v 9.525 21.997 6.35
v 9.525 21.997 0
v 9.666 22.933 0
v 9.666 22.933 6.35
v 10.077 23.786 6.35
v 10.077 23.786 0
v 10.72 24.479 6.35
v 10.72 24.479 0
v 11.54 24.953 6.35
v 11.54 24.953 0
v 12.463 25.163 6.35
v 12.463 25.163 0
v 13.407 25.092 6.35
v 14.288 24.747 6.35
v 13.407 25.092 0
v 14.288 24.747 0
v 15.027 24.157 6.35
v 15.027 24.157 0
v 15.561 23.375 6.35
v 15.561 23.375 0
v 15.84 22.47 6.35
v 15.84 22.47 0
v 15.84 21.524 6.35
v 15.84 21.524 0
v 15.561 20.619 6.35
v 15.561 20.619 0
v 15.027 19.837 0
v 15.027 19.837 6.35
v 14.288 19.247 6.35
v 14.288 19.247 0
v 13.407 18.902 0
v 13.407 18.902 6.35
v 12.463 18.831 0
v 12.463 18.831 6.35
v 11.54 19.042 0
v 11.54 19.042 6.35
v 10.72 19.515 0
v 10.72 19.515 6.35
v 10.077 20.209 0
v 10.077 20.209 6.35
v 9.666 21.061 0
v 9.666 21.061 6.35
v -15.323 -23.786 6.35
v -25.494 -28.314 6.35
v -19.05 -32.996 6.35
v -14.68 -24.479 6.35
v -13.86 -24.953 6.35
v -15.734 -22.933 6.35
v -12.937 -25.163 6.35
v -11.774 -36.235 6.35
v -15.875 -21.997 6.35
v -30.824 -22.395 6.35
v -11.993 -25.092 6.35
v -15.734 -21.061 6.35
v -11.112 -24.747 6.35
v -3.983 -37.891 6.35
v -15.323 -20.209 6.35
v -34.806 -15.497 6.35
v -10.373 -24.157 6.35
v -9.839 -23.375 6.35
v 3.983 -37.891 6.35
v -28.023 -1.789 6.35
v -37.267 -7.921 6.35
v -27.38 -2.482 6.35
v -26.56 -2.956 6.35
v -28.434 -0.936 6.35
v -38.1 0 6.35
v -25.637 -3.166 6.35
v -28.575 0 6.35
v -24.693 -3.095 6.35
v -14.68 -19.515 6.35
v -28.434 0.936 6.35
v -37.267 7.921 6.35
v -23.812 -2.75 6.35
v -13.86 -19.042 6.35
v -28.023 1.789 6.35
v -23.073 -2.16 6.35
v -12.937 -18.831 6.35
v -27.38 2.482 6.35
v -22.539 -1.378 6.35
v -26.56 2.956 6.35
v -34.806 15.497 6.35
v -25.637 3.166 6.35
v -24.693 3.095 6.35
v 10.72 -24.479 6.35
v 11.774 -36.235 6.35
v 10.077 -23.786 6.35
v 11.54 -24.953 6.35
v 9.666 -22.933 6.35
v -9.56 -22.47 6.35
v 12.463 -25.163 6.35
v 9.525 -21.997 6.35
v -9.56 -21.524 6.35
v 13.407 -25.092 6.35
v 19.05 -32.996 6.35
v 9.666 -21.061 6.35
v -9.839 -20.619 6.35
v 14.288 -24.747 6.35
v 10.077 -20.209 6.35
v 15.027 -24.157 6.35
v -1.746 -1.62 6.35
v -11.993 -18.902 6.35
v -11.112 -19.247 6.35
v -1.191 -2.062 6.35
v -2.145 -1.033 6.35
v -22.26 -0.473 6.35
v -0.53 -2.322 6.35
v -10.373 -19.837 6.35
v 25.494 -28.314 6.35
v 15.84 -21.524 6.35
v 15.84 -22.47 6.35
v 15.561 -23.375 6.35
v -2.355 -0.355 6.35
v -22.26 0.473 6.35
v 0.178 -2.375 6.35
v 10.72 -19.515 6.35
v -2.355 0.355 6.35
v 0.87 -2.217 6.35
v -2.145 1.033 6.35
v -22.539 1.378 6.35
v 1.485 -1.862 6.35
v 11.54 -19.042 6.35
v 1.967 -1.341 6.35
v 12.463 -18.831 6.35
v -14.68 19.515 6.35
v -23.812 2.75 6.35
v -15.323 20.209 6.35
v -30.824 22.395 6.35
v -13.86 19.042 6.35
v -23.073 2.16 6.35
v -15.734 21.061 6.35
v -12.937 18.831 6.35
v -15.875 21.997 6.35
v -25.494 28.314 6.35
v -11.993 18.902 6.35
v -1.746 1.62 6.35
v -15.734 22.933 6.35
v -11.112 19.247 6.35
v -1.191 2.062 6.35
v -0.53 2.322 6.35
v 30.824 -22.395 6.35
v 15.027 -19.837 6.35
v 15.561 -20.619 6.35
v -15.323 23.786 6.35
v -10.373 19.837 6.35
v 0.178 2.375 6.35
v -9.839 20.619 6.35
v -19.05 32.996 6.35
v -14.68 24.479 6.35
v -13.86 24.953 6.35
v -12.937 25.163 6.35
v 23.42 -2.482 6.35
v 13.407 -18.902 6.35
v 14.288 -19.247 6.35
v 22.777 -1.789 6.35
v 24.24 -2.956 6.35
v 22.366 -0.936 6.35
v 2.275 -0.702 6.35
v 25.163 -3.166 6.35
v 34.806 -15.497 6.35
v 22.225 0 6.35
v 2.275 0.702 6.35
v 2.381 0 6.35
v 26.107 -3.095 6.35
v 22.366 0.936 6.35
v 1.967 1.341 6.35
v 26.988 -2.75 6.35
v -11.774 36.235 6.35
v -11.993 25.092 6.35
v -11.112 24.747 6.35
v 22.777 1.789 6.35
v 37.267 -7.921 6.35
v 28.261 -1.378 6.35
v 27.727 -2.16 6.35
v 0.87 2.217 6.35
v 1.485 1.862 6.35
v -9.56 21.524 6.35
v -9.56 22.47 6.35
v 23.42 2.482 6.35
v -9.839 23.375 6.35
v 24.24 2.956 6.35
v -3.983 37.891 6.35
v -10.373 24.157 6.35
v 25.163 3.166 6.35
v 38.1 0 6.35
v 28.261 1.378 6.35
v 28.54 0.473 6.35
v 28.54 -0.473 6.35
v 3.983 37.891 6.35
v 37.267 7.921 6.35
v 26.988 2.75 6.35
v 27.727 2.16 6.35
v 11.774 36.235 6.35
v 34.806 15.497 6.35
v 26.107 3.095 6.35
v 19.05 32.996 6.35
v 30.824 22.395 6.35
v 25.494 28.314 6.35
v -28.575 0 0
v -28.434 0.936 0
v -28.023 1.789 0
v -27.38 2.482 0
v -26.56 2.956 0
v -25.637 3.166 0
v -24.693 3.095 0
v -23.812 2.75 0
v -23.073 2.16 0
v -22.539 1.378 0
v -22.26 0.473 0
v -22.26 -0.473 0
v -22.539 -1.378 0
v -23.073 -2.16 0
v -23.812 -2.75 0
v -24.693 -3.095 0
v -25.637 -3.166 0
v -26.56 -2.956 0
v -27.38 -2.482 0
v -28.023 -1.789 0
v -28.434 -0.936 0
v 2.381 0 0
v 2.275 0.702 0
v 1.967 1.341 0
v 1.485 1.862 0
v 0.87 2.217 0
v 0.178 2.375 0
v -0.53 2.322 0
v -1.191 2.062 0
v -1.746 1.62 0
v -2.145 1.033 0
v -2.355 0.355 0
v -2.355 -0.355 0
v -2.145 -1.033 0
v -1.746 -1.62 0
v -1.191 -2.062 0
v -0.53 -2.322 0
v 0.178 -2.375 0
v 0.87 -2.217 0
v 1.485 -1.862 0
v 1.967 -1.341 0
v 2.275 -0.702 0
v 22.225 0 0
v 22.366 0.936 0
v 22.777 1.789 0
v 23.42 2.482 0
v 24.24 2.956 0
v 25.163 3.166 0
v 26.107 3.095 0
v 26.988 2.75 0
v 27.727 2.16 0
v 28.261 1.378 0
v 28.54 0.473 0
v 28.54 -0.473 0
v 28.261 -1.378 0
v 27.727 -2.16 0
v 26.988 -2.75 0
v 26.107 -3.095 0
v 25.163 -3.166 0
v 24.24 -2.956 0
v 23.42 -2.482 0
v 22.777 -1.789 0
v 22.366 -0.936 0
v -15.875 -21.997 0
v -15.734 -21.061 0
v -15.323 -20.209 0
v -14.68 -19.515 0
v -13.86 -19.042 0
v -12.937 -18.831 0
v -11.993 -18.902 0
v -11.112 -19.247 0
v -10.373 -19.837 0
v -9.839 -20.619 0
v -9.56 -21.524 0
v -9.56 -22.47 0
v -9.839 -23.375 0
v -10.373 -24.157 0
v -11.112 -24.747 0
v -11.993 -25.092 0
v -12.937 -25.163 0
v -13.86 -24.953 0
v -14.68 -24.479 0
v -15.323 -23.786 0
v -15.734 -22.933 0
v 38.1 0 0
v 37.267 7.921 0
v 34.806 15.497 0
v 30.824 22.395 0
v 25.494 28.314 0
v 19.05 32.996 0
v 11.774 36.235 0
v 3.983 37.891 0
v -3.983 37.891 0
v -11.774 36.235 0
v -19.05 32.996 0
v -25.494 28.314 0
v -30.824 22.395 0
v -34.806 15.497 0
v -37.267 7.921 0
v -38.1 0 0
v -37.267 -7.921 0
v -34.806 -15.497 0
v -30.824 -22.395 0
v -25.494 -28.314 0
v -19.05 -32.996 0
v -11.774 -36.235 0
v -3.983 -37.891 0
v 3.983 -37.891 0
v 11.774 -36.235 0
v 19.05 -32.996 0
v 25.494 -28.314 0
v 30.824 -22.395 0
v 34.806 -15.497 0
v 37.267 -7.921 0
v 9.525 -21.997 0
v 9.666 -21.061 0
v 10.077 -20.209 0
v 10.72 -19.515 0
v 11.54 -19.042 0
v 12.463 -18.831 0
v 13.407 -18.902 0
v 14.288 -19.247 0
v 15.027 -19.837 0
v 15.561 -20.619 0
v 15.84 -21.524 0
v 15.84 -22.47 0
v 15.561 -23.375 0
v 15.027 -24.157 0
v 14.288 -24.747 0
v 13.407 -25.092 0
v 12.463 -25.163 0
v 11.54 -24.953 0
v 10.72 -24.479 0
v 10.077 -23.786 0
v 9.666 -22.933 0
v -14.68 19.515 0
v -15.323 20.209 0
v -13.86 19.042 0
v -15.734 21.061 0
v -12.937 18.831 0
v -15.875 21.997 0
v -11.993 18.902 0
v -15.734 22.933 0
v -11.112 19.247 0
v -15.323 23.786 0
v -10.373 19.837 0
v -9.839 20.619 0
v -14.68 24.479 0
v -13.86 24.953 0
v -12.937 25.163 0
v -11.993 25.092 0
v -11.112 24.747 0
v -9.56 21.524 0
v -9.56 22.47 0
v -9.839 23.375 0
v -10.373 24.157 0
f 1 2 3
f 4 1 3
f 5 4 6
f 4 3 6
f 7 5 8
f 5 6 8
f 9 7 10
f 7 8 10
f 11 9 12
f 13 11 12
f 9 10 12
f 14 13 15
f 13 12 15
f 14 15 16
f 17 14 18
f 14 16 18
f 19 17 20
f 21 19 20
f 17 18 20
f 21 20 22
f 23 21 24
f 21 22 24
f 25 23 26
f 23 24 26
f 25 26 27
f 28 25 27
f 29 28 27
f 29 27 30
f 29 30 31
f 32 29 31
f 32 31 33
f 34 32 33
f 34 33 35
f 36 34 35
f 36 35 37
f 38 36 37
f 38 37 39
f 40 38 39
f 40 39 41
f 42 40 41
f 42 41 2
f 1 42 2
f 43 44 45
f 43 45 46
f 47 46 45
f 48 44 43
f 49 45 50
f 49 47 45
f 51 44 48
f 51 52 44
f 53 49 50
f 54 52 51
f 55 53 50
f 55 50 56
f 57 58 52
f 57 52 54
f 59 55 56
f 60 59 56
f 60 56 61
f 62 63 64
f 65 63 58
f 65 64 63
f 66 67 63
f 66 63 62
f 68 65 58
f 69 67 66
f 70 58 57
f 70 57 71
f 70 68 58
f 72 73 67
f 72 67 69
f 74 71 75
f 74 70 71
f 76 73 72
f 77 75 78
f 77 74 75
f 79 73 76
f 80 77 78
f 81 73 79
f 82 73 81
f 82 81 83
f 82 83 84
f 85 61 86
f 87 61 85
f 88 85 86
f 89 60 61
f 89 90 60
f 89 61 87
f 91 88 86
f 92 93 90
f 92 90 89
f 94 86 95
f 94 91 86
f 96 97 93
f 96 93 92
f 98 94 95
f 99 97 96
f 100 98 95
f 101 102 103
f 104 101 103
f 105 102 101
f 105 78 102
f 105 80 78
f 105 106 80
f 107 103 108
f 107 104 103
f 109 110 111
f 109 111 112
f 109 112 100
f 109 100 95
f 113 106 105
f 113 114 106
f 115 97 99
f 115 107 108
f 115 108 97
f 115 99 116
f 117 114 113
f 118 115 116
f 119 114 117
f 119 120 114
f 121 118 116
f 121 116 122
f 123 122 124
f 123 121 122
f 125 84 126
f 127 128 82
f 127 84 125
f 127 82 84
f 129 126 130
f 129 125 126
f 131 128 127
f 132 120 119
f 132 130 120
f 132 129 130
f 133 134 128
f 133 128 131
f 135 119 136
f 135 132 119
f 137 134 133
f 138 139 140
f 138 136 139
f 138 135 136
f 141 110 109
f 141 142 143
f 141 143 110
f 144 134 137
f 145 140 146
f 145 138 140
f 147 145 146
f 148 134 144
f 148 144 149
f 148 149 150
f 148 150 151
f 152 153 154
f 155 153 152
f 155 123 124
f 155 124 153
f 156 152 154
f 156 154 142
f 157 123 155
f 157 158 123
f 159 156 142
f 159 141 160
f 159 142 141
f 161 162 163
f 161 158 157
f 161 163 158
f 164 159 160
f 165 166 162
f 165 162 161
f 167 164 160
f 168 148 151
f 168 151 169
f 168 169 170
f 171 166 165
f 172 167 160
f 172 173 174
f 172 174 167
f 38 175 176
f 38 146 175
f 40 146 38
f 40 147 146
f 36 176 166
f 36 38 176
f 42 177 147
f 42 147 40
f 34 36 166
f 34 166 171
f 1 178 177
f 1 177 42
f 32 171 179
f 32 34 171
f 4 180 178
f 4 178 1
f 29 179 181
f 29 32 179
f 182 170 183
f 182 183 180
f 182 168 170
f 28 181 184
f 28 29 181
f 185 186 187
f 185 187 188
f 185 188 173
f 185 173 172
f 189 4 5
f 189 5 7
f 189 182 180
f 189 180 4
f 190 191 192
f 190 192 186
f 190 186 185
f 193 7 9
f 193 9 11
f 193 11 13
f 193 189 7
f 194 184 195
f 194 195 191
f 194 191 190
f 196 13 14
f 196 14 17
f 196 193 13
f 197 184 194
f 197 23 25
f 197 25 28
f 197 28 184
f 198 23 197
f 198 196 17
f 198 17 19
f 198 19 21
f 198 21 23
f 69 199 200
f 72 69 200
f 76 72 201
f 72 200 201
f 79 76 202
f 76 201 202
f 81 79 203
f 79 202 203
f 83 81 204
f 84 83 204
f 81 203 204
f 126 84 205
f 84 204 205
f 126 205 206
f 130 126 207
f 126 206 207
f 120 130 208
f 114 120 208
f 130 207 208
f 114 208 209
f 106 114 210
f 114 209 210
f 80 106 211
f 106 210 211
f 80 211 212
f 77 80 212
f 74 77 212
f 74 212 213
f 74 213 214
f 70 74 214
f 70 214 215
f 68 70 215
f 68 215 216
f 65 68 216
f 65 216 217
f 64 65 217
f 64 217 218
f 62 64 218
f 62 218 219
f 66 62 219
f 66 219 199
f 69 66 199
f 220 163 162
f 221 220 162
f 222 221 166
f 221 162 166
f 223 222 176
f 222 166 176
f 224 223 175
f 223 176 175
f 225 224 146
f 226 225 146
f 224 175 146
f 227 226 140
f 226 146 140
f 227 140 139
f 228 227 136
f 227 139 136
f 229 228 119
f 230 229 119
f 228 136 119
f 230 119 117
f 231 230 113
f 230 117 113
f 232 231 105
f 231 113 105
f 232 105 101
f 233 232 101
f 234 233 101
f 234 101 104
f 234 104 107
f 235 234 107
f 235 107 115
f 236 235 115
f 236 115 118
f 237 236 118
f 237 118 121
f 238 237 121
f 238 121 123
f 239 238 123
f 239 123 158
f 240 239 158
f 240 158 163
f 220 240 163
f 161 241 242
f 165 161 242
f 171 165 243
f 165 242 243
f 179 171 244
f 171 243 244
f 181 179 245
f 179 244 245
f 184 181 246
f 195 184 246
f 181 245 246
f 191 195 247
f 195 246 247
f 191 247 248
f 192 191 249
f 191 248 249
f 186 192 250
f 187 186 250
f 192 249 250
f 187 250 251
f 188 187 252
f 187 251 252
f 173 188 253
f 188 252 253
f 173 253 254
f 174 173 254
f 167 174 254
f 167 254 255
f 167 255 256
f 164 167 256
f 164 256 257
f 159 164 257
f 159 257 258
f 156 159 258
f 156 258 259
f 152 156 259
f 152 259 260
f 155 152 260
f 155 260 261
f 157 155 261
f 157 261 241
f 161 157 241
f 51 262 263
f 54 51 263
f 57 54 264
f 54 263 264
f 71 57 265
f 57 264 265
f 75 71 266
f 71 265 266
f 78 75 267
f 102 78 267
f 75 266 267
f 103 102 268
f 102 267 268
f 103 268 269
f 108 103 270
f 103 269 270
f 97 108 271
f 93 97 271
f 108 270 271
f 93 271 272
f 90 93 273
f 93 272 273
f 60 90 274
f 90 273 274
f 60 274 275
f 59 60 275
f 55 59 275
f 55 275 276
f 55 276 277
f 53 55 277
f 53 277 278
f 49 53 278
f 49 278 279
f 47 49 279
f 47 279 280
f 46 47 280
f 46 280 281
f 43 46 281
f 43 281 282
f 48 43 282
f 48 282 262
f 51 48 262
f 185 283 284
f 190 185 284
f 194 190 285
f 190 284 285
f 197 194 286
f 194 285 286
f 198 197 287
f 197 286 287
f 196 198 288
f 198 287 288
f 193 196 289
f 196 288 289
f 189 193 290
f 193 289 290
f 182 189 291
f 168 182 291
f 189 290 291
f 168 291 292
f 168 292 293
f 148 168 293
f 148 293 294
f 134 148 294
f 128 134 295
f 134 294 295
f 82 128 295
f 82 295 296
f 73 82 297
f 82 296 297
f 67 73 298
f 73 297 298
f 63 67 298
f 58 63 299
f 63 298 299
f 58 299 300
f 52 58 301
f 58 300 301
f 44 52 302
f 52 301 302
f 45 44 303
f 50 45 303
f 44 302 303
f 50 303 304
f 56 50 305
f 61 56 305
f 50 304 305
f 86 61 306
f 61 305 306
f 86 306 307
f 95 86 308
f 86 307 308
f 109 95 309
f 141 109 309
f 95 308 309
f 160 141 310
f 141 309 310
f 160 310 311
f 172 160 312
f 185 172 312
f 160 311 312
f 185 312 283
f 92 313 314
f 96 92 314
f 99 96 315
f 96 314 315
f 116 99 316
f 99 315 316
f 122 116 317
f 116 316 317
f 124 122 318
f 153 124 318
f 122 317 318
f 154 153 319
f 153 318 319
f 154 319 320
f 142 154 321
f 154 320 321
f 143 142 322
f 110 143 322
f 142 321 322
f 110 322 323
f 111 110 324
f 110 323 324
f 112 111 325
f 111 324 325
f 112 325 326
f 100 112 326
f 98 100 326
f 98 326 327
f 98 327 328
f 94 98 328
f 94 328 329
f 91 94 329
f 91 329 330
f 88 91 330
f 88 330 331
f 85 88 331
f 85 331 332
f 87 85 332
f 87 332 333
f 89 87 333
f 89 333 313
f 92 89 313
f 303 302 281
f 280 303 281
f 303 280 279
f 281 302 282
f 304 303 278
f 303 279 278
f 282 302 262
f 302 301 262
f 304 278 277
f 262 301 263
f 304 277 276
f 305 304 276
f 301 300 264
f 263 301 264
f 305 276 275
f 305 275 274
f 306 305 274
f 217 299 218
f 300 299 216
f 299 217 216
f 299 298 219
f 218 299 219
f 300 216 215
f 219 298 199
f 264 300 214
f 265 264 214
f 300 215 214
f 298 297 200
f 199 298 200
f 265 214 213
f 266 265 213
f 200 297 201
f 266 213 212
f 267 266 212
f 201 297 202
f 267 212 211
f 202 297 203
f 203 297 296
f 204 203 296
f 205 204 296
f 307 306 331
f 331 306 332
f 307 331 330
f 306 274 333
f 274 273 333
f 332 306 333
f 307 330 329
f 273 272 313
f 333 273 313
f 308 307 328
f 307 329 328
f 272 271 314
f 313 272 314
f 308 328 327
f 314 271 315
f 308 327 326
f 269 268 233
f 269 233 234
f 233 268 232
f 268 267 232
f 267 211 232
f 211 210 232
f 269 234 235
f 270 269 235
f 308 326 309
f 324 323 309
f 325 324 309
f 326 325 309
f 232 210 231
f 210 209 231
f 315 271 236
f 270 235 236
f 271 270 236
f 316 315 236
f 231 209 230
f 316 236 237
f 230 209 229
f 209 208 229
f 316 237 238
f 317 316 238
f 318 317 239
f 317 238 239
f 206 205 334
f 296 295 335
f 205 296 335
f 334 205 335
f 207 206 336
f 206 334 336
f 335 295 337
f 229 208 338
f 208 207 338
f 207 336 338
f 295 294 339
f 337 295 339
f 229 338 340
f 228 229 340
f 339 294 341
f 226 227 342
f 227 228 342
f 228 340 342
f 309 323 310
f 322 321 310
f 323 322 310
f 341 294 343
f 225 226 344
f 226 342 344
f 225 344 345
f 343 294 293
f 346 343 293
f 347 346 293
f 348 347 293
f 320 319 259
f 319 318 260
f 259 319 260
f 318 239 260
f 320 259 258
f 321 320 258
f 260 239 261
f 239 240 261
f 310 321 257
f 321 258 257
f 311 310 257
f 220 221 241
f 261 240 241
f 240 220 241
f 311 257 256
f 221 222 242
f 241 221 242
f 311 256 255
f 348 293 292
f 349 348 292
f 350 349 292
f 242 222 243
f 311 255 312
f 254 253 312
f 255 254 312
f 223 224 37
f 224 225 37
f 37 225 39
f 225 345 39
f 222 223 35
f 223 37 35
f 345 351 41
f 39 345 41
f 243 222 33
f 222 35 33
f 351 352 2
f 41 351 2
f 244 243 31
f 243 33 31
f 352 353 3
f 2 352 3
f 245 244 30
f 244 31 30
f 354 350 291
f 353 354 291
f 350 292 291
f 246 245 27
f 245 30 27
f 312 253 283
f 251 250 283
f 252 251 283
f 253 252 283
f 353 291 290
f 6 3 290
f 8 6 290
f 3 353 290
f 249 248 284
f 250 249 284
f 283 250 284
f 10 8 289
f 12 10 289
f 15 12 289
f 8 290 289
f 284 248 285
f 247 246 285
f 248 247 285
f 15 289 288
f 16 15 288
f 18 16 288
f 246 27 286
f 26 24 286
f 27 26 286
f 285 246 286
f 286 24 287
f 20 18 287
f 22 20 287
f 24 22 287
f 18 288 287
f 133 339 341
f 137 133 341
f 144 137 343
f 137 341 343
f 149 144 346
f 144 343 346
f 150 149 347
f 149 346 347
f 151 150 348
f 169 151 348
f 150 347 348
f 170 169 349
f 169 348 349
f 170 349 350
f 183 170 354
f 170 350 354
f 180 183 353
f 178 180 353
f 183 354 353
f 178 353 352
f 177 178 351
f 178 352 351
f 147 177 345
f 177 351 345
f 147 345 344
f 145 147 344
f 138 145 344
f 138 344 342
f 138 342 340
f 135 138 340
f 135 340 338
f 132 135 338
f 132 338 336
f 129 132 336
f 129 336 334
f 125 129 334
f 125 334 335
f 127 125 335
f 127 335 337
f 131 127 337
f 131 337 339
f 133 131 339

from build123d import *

# Parameters (mm, degrees)
SKETCH1_R           = 38.1
BOSS_EXTRUDE1_DEPTH = 6.35
SKETCH4_R           = 3.175
CUT_EXTRUDE2_DEPTH  = 55.254423783
SKETCH2_R           = 2.38125
CUT_EXTRUDE3_DEPTH  = 55.254423783


with BuildPart() as part:
    # Sketch1 → Boss-Extrude1 (new body)
    with BuildSketch(Plane.XY):
        Circle(SKETCH1_R)
    extrude(amount=BOSS_EXTRUDE1_DEPTH)

    # Sketch4 → Cut-Extrude2 (cut, through all)
    with BuildSketch(Plane(origin=(0, 0, 0), x_dir=(-1, 0, 0), z_dir=(0, 0, -1))):
        with Locations((-25.4, 0)):
            Circle(SKETCH4_R)
        with Locations((-12.7, 21.997045256)):
            Circle(SKETCH4_R)
        with Locations((12.7, 21.997045256)):
            Circle(SKETCH4_R)
        with Locations((25.4, 0)):
            Circle(SKETCH4_R)
        with Locations((12.7, -21.997045256)):
            Circle(SKETCH4_R)
        with Locations((-12.7, -21.997045256)):
            Circle(SKETCH4_R)
    extrude(amount=-CUT_EXTRUDE2_DEPTH, mode=Mode.SUBTRACT)

    # Sketch2 → Cut-Extrude3 (cut, through all)
    with BuildSketch(Plane.XY.offset(6.35)):
        Circle(SKETCH2_R)
    extrude(amount=-CUT_EXTRUDE3_DEPTH, mode=Mode.SUBTRACT)


solid = part.part
